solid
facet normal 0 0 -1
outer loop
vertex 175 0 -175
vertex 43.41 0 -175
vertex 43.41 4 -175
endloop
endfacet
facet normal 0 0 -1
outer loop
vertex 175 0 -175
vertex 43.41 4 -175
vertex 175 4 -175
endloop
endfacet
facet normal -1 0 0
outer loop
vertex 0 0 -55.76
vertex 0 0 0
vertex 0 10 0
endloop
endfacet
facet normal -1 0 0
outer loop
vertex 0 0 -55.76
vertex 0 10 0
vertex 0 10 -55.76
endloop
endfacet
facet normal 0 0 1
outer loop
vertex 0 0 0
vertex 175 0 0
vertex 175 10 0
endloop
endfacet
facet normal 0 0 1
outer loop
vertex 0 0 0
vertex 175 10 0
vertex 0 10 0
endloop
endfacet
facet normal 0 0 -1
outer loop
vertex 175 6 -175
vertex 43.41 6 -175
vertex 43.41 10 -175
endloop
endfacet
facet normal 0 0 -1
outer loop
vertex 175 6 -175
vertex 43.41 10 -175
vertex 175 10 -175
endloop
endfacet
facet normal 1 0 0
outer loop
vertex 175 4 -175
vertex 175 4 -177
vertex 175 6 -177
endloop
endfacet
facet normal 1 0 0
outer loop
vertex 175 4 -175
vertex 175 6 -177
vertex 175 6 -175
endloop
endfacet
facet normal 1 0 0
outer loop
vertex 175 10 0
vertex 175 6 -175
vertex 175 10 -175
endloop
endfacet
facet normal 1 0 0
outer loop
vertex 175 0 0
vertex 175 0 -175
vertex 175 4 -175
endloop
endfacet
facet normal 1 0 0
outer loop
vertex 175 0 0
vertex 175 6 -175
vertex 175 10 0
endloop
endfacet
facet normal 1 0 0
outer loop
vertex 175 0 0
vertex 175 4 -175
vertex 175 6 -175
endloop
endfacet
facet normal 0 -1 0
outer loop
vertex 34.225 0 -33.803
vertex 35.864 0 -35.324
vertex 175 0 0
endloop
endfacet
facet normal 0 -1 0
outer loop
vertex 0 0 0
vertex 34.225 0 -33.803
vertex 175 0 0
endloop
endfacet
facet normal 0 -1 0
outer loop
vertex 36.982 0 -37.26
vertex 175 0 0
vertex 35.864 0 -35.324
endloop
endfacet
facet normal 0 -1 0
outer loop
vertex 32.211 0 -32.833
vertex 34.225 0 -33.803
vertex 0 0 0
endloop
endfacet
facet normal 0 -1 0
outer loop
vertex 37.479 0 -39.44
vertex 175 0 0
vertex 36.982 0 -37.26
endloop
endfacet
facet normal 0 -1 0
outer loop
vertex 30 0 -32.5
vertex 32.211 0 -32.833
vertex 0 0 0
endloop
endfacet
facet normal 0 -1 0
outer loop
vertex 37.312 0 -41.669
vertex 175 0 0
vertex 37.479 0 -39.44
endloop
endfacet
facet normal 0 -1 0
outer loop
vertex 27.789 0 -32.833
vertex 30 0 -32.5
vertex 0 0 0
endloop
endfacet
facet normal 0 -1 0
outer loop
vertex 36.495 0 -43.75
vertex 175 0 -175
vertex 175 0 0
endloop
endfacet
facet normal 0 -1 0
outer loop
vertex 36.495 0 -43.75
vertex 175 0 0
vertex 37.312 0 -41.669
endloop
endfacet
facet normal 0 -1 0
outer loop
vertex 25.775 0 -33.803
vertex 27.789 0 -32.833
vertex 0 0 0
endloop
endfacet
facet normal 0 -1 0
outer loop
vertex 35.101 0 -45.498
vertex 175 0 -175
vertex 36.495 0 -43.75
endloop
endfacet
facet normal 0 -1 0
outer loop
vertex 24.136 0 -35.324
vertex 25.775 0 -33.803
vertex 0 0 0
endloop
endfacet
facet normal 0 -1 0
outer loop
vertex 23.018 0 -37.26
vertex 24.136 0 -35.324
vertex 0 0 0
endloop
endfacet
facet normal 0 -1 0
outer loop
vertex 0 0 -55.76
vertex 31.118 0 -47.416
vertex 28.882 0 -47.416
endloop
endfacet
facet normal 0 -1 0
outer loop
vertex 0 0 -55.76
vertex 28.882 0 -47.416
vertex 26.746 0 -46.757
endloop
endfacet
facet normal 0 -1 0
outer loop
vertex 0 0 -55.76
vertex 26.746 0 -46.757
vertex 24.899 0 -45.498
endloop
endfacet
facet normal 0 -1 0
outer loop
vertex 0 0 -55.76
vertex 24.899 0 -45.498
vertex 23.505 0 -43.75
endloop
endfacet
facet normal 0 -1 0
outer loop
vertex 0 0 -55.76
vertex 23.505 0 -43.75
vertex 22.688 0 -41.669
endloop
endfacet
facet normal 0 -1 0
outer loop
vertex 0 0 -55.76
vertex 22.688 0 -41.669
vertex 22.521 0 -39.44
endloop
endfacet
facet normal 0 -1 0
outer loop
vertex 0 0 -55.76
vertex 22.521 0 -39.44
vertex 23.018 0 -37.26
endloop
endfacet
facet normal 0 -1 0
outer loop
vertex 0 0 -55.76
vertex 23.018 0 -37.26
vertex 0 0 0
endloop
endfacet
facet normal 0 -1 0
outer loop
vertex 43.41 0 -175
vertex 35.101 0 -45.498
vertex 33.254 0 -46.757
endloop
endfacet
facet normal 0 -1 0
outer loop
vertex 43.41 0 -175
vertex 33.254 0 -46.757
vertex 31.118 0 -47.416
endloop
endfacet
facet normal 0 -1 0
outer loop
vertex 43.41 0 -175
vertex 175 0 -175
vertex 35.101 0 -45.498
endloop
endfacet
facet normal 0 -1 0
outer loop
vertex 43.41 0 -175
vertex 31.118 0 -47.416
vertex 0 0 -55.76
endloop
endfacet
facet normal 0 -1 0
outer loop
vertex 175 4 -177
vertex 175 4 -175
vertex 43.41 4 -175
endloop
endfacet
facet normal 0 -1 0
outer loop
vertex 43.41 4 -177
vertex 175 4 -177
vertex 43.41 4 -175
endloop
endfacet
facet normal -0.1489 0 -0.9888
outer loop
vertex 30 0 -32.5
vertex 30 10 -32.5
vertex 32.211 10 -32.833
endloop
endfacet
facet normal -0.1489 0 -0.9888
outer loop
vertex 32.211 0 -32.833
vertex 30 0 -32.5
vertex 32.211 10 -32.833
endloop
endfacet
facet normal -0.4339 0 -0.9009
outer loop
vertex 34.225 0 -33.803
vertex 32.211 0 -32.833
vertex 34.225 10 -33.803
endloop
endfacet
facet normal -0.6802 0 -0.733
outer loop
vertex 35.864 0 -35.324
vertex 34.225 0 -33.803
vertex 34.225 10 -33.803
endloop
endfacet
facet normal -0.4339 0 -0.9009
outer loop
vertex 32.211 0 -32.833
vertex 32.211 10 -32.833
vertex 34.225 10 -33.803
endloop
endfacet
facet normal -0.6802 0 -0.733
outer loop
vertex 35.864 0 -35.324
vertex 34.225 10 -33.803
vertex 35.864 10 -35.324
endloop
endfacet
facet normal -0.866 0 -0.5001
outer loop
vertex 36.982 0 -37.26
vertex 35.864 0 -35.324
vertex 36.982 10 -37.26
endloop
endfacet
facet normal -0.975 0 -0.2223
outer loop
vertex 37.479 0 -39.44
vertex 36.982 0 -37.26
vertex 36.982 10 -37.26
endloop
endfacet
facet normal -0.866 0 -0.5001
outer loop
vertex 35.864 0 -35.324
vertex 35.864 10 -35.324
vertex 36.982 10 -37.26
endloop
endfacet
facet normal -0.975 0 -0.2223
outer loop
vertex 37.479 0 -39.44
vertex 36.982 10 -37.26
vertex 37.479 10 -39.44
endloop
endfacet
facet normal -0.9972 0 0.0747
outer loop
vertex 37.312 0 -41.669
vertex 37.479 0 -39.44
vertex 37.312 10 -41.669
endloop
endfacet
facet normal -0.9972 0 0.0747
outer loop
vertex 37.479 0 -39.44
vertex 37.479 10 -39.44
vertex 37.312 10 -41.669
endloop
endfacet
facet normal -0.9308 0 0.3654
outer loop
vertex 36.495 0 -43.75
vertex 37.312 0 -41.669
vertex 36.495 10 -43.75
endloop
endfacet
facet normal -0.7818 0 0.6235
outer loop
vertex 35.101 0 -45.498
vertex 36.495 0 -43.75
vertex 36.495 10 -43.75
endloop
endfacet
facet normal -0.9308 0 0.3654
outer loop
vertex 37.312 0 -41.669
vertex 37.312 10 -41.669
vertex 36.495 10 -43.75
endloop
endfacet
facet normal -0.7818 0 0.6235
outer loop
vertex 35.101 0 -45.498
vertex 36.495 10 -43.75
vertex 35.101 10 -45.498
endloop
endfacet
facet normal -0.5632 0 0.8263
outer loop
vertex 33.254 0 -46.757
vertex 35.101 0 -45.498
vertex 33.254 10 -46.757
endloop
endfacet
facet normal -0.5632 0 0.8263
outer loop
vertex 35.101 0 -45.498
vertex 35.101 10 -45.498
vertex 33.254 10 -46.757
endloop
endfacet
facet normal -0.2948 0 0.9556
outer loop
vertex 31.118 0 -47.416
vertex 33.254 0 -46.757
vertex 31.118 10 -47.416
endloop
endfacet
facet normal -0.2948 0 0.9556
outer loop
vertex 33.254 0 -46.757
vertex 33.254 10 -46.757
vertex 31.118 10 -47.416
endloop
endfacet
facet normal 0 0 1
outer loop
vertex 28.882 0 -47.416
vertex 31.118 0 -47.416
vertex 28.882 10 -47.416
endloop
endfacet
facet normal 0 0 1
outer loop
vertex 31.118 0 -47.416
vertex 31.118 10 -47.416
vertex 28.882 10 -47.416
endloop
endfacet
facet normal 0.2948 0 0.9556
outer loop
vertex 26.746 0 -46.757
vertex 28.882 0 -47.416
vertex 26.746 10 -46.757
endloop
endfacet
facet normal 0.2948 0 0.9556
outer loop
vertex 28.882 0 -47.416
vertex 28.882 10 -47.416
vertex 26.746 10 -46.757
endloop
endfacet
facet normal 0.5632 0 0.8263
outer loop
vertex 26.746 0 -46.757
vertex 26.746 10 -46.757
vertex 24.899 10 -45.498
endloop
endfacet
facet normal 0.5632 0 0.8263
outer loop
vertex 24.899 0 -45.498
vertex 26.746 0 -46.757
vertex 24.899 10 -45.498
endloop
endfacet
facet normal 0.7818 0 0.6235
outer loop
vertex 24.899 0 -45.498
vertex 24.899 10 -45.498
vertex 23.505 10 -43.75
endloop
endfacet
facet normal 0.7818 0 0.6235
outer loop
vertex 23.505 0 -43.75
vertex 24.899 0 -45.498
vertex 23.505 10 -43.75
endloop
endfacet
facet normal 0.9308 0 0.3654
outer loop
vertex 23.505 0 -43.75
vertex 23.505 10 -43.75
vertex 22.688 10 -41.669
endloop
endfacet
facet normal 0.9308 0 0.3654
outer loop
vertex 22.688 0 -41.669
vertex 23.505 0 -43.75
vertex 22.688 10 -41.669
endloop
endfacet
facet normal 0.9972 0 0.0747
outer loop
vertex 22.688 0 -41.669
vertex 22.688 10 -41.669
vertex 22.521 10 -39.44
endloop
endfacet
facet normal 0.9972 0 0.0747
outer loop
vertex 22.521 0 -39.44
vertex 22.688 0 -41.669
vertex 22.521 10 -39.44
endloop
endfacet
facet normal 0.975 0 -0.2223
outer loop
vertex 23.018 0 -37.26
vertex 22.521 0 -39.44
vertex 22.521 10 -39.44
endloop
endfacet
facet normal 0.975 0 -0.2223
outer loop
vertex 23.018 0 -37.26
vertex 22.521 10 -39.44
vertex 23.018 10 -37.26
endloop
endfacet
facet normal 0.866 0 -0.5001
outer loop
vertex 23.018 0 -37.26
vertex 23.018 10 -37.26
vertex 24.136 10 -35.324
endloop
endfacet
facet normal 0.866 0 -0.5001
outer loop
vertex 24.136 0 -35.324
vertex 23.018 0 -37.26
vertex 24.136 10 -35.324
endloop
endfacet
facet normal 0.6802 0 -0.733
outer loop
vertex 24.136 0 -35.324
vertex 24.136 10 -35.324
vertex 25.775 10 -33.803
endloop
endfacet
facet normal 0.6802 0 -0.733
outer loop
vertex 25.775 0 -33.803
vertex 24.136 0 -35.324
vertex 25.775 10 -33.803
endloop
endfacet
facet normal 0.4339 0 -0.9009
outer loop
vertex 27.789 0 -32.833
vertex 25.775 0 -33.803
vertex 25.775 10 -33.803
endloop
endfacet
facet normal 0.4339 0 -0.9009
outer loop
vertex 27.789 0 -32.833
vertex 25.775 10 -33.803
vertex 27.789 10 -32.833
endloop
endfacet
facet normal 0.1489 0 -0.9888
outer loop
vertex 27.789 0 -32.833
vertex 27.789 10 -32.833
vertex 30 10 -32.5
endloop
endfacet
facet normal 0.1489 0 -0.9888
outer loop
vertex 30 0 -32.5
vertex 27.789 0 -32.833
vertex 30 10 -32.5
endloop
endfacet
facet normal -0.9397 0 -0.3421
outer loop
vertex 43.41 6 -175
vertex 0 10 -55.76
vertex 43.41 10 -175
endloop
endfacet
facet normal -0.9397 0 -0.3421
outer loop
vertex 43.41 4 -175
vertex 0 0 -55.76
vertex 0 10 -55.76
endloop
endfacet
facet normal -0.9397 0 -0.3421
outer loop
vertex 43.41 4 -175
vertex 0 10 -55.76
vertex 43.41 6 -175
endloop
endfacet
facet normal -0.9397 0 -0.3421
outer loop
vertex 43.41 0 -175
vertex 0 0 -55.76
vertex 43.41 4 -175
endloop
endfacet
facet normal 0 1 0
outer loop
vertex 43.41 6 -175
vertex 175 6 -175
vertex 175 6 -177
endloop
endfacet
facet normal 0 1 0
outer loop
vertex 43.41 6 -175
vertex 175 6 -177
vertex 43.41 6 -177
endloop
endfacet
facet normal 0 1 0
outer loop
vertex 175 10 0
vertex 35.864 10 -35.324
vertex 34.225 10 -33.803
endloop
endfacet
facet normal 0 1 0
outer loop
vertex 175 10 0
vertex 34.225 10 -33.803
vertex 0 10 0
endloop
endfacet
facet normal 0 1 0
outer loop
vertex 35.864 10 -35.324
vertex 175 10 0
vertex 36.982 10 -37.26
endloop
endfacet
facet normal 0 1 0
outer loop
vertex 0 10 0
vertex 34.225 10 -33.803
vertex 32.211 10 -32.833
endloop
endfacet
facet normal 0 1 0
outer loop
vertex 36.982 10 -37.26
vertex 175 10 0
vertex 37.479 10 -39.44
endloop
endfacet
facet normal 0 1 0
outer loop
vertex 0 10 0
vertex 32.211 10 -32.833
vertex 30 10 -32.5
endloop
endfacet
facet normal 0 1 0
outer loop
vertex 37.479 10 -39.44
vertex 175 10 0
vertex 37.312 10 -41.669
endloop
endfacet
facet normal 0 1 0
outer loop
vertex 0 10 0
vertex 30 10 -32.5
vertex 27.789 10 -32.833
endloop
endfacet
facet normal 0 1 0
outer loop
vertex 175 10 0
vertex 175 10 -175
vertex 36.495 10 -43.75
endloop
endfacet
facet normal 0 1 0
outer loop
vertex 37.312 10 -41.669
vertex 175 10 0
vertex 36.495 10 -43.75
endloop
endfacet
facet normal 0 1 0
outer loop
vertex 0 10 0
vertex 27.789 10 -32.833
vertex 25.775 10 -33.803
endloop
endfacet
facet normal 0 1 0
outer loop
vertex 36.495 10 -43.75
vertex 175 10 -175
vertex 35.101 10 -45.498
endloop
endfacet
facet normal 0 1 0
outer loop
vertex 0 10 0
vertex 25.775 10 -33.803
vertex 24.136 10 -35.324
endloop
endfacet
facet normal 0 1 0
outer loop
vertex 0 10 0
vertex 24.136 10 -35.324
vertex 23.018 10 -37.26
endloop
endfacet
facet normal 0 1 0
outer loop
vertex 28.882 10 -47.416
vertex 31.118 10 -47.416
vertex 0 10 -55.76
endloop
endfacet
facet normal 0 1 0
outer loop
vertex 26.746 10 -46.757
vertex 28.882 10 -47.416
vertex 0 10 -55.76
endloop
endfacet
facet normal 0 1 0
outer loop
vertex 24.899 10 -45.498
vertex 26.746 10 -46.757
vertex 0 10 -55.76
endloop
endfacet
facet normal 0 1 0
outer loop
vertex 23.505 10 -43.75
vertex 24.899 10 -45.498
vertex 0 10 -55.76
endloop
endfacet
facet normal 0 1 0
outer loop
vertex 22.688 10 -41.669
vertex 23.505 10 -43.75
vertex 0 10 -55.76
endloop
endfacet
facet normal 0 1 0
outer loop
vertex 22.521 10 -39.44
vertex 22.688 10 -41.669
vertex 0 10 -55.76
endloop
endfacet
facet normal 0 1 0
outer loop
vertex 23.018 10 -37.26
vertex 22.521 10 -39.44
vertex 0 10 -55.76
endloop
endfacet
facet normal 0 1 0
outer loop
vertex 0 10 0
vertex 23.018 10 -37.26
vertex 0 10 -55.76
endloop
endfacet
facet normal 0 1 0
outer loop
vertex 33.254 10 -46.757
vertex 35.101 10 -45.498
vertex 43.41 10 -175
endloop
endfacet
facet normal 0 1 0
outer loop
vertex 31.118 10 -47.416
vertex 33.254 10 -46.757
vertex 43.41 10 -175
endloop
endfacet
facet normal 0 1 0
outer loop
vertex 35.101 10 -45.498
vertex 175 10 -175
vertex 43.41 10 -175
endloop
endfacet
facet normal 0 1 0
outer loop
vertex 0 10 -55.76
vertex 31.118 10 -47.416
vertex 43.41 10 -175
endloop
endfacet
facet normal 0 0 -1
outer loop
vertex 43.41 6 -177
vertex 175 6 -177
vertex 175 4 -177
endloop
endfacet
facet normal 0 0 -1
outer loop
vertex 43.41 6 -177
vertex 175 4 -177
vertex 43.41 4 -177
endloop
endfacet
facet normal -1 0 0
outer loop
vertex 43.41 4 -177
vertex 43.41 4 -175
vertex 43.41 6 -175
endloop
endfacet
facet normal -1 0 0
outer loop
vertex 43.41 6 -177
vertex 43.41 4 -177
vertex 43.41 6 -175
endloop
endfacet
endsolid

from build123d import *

# Parameters (mm, degrees)
BOSS_EXTRUDE1_DEPTH = 10
SKETCH2_W           = 131.59
SKETCH2_H           = 2
BOSS_EXTRUDE2_DEPTH = 2
SKETCH3_R           = 7.5
CUT_EXTRUDE1_DEPTH  = 250.106402969


with BuildPart() as part:
    # Sketch1 → Boss-Extrude1 (new body)
    with BuildSketch(Plane(origin=(0, 0, 0), x_dir=(1, 0, 0), z_dir=(0, 1, 0))):
        Polygon((0, 55.76), (43.41, 175), (175, 175), (175, 0), (0, 0), align=None)
    extrude(amount=BOSS_EXTRUDE1_DEPTH)

    # Sketch2 → Boss-Extrude2 (add)
    with BuildSketch(Plane(origin=(0, 0, -175), x_dir=(-1, 0, 0), z_dir=(0, 0, -1))):
        with Locations((-109.205, 5)):
            Rectangle(SKETCH2_W, SKETCH2_H)
    extrude(amount=BOSS_EXTRUDE2_DEPTH)

    # Sketch3 → Cut-Extrude1 (cut, through all)
    with BuildSketch(Plane(origin=(0, 10, 0), x_dir=(1, 0, 0), z_dir=(0, 1, 0))):
        with Locations(Location((30, 40, 0), (0, 0, 270))):
            Circle(SKETCH3_R)
    extrude(amount=-CUT_EXTRUDE1_DEPTH, mode=Mode.SUBTRACT)


solid = part.part
